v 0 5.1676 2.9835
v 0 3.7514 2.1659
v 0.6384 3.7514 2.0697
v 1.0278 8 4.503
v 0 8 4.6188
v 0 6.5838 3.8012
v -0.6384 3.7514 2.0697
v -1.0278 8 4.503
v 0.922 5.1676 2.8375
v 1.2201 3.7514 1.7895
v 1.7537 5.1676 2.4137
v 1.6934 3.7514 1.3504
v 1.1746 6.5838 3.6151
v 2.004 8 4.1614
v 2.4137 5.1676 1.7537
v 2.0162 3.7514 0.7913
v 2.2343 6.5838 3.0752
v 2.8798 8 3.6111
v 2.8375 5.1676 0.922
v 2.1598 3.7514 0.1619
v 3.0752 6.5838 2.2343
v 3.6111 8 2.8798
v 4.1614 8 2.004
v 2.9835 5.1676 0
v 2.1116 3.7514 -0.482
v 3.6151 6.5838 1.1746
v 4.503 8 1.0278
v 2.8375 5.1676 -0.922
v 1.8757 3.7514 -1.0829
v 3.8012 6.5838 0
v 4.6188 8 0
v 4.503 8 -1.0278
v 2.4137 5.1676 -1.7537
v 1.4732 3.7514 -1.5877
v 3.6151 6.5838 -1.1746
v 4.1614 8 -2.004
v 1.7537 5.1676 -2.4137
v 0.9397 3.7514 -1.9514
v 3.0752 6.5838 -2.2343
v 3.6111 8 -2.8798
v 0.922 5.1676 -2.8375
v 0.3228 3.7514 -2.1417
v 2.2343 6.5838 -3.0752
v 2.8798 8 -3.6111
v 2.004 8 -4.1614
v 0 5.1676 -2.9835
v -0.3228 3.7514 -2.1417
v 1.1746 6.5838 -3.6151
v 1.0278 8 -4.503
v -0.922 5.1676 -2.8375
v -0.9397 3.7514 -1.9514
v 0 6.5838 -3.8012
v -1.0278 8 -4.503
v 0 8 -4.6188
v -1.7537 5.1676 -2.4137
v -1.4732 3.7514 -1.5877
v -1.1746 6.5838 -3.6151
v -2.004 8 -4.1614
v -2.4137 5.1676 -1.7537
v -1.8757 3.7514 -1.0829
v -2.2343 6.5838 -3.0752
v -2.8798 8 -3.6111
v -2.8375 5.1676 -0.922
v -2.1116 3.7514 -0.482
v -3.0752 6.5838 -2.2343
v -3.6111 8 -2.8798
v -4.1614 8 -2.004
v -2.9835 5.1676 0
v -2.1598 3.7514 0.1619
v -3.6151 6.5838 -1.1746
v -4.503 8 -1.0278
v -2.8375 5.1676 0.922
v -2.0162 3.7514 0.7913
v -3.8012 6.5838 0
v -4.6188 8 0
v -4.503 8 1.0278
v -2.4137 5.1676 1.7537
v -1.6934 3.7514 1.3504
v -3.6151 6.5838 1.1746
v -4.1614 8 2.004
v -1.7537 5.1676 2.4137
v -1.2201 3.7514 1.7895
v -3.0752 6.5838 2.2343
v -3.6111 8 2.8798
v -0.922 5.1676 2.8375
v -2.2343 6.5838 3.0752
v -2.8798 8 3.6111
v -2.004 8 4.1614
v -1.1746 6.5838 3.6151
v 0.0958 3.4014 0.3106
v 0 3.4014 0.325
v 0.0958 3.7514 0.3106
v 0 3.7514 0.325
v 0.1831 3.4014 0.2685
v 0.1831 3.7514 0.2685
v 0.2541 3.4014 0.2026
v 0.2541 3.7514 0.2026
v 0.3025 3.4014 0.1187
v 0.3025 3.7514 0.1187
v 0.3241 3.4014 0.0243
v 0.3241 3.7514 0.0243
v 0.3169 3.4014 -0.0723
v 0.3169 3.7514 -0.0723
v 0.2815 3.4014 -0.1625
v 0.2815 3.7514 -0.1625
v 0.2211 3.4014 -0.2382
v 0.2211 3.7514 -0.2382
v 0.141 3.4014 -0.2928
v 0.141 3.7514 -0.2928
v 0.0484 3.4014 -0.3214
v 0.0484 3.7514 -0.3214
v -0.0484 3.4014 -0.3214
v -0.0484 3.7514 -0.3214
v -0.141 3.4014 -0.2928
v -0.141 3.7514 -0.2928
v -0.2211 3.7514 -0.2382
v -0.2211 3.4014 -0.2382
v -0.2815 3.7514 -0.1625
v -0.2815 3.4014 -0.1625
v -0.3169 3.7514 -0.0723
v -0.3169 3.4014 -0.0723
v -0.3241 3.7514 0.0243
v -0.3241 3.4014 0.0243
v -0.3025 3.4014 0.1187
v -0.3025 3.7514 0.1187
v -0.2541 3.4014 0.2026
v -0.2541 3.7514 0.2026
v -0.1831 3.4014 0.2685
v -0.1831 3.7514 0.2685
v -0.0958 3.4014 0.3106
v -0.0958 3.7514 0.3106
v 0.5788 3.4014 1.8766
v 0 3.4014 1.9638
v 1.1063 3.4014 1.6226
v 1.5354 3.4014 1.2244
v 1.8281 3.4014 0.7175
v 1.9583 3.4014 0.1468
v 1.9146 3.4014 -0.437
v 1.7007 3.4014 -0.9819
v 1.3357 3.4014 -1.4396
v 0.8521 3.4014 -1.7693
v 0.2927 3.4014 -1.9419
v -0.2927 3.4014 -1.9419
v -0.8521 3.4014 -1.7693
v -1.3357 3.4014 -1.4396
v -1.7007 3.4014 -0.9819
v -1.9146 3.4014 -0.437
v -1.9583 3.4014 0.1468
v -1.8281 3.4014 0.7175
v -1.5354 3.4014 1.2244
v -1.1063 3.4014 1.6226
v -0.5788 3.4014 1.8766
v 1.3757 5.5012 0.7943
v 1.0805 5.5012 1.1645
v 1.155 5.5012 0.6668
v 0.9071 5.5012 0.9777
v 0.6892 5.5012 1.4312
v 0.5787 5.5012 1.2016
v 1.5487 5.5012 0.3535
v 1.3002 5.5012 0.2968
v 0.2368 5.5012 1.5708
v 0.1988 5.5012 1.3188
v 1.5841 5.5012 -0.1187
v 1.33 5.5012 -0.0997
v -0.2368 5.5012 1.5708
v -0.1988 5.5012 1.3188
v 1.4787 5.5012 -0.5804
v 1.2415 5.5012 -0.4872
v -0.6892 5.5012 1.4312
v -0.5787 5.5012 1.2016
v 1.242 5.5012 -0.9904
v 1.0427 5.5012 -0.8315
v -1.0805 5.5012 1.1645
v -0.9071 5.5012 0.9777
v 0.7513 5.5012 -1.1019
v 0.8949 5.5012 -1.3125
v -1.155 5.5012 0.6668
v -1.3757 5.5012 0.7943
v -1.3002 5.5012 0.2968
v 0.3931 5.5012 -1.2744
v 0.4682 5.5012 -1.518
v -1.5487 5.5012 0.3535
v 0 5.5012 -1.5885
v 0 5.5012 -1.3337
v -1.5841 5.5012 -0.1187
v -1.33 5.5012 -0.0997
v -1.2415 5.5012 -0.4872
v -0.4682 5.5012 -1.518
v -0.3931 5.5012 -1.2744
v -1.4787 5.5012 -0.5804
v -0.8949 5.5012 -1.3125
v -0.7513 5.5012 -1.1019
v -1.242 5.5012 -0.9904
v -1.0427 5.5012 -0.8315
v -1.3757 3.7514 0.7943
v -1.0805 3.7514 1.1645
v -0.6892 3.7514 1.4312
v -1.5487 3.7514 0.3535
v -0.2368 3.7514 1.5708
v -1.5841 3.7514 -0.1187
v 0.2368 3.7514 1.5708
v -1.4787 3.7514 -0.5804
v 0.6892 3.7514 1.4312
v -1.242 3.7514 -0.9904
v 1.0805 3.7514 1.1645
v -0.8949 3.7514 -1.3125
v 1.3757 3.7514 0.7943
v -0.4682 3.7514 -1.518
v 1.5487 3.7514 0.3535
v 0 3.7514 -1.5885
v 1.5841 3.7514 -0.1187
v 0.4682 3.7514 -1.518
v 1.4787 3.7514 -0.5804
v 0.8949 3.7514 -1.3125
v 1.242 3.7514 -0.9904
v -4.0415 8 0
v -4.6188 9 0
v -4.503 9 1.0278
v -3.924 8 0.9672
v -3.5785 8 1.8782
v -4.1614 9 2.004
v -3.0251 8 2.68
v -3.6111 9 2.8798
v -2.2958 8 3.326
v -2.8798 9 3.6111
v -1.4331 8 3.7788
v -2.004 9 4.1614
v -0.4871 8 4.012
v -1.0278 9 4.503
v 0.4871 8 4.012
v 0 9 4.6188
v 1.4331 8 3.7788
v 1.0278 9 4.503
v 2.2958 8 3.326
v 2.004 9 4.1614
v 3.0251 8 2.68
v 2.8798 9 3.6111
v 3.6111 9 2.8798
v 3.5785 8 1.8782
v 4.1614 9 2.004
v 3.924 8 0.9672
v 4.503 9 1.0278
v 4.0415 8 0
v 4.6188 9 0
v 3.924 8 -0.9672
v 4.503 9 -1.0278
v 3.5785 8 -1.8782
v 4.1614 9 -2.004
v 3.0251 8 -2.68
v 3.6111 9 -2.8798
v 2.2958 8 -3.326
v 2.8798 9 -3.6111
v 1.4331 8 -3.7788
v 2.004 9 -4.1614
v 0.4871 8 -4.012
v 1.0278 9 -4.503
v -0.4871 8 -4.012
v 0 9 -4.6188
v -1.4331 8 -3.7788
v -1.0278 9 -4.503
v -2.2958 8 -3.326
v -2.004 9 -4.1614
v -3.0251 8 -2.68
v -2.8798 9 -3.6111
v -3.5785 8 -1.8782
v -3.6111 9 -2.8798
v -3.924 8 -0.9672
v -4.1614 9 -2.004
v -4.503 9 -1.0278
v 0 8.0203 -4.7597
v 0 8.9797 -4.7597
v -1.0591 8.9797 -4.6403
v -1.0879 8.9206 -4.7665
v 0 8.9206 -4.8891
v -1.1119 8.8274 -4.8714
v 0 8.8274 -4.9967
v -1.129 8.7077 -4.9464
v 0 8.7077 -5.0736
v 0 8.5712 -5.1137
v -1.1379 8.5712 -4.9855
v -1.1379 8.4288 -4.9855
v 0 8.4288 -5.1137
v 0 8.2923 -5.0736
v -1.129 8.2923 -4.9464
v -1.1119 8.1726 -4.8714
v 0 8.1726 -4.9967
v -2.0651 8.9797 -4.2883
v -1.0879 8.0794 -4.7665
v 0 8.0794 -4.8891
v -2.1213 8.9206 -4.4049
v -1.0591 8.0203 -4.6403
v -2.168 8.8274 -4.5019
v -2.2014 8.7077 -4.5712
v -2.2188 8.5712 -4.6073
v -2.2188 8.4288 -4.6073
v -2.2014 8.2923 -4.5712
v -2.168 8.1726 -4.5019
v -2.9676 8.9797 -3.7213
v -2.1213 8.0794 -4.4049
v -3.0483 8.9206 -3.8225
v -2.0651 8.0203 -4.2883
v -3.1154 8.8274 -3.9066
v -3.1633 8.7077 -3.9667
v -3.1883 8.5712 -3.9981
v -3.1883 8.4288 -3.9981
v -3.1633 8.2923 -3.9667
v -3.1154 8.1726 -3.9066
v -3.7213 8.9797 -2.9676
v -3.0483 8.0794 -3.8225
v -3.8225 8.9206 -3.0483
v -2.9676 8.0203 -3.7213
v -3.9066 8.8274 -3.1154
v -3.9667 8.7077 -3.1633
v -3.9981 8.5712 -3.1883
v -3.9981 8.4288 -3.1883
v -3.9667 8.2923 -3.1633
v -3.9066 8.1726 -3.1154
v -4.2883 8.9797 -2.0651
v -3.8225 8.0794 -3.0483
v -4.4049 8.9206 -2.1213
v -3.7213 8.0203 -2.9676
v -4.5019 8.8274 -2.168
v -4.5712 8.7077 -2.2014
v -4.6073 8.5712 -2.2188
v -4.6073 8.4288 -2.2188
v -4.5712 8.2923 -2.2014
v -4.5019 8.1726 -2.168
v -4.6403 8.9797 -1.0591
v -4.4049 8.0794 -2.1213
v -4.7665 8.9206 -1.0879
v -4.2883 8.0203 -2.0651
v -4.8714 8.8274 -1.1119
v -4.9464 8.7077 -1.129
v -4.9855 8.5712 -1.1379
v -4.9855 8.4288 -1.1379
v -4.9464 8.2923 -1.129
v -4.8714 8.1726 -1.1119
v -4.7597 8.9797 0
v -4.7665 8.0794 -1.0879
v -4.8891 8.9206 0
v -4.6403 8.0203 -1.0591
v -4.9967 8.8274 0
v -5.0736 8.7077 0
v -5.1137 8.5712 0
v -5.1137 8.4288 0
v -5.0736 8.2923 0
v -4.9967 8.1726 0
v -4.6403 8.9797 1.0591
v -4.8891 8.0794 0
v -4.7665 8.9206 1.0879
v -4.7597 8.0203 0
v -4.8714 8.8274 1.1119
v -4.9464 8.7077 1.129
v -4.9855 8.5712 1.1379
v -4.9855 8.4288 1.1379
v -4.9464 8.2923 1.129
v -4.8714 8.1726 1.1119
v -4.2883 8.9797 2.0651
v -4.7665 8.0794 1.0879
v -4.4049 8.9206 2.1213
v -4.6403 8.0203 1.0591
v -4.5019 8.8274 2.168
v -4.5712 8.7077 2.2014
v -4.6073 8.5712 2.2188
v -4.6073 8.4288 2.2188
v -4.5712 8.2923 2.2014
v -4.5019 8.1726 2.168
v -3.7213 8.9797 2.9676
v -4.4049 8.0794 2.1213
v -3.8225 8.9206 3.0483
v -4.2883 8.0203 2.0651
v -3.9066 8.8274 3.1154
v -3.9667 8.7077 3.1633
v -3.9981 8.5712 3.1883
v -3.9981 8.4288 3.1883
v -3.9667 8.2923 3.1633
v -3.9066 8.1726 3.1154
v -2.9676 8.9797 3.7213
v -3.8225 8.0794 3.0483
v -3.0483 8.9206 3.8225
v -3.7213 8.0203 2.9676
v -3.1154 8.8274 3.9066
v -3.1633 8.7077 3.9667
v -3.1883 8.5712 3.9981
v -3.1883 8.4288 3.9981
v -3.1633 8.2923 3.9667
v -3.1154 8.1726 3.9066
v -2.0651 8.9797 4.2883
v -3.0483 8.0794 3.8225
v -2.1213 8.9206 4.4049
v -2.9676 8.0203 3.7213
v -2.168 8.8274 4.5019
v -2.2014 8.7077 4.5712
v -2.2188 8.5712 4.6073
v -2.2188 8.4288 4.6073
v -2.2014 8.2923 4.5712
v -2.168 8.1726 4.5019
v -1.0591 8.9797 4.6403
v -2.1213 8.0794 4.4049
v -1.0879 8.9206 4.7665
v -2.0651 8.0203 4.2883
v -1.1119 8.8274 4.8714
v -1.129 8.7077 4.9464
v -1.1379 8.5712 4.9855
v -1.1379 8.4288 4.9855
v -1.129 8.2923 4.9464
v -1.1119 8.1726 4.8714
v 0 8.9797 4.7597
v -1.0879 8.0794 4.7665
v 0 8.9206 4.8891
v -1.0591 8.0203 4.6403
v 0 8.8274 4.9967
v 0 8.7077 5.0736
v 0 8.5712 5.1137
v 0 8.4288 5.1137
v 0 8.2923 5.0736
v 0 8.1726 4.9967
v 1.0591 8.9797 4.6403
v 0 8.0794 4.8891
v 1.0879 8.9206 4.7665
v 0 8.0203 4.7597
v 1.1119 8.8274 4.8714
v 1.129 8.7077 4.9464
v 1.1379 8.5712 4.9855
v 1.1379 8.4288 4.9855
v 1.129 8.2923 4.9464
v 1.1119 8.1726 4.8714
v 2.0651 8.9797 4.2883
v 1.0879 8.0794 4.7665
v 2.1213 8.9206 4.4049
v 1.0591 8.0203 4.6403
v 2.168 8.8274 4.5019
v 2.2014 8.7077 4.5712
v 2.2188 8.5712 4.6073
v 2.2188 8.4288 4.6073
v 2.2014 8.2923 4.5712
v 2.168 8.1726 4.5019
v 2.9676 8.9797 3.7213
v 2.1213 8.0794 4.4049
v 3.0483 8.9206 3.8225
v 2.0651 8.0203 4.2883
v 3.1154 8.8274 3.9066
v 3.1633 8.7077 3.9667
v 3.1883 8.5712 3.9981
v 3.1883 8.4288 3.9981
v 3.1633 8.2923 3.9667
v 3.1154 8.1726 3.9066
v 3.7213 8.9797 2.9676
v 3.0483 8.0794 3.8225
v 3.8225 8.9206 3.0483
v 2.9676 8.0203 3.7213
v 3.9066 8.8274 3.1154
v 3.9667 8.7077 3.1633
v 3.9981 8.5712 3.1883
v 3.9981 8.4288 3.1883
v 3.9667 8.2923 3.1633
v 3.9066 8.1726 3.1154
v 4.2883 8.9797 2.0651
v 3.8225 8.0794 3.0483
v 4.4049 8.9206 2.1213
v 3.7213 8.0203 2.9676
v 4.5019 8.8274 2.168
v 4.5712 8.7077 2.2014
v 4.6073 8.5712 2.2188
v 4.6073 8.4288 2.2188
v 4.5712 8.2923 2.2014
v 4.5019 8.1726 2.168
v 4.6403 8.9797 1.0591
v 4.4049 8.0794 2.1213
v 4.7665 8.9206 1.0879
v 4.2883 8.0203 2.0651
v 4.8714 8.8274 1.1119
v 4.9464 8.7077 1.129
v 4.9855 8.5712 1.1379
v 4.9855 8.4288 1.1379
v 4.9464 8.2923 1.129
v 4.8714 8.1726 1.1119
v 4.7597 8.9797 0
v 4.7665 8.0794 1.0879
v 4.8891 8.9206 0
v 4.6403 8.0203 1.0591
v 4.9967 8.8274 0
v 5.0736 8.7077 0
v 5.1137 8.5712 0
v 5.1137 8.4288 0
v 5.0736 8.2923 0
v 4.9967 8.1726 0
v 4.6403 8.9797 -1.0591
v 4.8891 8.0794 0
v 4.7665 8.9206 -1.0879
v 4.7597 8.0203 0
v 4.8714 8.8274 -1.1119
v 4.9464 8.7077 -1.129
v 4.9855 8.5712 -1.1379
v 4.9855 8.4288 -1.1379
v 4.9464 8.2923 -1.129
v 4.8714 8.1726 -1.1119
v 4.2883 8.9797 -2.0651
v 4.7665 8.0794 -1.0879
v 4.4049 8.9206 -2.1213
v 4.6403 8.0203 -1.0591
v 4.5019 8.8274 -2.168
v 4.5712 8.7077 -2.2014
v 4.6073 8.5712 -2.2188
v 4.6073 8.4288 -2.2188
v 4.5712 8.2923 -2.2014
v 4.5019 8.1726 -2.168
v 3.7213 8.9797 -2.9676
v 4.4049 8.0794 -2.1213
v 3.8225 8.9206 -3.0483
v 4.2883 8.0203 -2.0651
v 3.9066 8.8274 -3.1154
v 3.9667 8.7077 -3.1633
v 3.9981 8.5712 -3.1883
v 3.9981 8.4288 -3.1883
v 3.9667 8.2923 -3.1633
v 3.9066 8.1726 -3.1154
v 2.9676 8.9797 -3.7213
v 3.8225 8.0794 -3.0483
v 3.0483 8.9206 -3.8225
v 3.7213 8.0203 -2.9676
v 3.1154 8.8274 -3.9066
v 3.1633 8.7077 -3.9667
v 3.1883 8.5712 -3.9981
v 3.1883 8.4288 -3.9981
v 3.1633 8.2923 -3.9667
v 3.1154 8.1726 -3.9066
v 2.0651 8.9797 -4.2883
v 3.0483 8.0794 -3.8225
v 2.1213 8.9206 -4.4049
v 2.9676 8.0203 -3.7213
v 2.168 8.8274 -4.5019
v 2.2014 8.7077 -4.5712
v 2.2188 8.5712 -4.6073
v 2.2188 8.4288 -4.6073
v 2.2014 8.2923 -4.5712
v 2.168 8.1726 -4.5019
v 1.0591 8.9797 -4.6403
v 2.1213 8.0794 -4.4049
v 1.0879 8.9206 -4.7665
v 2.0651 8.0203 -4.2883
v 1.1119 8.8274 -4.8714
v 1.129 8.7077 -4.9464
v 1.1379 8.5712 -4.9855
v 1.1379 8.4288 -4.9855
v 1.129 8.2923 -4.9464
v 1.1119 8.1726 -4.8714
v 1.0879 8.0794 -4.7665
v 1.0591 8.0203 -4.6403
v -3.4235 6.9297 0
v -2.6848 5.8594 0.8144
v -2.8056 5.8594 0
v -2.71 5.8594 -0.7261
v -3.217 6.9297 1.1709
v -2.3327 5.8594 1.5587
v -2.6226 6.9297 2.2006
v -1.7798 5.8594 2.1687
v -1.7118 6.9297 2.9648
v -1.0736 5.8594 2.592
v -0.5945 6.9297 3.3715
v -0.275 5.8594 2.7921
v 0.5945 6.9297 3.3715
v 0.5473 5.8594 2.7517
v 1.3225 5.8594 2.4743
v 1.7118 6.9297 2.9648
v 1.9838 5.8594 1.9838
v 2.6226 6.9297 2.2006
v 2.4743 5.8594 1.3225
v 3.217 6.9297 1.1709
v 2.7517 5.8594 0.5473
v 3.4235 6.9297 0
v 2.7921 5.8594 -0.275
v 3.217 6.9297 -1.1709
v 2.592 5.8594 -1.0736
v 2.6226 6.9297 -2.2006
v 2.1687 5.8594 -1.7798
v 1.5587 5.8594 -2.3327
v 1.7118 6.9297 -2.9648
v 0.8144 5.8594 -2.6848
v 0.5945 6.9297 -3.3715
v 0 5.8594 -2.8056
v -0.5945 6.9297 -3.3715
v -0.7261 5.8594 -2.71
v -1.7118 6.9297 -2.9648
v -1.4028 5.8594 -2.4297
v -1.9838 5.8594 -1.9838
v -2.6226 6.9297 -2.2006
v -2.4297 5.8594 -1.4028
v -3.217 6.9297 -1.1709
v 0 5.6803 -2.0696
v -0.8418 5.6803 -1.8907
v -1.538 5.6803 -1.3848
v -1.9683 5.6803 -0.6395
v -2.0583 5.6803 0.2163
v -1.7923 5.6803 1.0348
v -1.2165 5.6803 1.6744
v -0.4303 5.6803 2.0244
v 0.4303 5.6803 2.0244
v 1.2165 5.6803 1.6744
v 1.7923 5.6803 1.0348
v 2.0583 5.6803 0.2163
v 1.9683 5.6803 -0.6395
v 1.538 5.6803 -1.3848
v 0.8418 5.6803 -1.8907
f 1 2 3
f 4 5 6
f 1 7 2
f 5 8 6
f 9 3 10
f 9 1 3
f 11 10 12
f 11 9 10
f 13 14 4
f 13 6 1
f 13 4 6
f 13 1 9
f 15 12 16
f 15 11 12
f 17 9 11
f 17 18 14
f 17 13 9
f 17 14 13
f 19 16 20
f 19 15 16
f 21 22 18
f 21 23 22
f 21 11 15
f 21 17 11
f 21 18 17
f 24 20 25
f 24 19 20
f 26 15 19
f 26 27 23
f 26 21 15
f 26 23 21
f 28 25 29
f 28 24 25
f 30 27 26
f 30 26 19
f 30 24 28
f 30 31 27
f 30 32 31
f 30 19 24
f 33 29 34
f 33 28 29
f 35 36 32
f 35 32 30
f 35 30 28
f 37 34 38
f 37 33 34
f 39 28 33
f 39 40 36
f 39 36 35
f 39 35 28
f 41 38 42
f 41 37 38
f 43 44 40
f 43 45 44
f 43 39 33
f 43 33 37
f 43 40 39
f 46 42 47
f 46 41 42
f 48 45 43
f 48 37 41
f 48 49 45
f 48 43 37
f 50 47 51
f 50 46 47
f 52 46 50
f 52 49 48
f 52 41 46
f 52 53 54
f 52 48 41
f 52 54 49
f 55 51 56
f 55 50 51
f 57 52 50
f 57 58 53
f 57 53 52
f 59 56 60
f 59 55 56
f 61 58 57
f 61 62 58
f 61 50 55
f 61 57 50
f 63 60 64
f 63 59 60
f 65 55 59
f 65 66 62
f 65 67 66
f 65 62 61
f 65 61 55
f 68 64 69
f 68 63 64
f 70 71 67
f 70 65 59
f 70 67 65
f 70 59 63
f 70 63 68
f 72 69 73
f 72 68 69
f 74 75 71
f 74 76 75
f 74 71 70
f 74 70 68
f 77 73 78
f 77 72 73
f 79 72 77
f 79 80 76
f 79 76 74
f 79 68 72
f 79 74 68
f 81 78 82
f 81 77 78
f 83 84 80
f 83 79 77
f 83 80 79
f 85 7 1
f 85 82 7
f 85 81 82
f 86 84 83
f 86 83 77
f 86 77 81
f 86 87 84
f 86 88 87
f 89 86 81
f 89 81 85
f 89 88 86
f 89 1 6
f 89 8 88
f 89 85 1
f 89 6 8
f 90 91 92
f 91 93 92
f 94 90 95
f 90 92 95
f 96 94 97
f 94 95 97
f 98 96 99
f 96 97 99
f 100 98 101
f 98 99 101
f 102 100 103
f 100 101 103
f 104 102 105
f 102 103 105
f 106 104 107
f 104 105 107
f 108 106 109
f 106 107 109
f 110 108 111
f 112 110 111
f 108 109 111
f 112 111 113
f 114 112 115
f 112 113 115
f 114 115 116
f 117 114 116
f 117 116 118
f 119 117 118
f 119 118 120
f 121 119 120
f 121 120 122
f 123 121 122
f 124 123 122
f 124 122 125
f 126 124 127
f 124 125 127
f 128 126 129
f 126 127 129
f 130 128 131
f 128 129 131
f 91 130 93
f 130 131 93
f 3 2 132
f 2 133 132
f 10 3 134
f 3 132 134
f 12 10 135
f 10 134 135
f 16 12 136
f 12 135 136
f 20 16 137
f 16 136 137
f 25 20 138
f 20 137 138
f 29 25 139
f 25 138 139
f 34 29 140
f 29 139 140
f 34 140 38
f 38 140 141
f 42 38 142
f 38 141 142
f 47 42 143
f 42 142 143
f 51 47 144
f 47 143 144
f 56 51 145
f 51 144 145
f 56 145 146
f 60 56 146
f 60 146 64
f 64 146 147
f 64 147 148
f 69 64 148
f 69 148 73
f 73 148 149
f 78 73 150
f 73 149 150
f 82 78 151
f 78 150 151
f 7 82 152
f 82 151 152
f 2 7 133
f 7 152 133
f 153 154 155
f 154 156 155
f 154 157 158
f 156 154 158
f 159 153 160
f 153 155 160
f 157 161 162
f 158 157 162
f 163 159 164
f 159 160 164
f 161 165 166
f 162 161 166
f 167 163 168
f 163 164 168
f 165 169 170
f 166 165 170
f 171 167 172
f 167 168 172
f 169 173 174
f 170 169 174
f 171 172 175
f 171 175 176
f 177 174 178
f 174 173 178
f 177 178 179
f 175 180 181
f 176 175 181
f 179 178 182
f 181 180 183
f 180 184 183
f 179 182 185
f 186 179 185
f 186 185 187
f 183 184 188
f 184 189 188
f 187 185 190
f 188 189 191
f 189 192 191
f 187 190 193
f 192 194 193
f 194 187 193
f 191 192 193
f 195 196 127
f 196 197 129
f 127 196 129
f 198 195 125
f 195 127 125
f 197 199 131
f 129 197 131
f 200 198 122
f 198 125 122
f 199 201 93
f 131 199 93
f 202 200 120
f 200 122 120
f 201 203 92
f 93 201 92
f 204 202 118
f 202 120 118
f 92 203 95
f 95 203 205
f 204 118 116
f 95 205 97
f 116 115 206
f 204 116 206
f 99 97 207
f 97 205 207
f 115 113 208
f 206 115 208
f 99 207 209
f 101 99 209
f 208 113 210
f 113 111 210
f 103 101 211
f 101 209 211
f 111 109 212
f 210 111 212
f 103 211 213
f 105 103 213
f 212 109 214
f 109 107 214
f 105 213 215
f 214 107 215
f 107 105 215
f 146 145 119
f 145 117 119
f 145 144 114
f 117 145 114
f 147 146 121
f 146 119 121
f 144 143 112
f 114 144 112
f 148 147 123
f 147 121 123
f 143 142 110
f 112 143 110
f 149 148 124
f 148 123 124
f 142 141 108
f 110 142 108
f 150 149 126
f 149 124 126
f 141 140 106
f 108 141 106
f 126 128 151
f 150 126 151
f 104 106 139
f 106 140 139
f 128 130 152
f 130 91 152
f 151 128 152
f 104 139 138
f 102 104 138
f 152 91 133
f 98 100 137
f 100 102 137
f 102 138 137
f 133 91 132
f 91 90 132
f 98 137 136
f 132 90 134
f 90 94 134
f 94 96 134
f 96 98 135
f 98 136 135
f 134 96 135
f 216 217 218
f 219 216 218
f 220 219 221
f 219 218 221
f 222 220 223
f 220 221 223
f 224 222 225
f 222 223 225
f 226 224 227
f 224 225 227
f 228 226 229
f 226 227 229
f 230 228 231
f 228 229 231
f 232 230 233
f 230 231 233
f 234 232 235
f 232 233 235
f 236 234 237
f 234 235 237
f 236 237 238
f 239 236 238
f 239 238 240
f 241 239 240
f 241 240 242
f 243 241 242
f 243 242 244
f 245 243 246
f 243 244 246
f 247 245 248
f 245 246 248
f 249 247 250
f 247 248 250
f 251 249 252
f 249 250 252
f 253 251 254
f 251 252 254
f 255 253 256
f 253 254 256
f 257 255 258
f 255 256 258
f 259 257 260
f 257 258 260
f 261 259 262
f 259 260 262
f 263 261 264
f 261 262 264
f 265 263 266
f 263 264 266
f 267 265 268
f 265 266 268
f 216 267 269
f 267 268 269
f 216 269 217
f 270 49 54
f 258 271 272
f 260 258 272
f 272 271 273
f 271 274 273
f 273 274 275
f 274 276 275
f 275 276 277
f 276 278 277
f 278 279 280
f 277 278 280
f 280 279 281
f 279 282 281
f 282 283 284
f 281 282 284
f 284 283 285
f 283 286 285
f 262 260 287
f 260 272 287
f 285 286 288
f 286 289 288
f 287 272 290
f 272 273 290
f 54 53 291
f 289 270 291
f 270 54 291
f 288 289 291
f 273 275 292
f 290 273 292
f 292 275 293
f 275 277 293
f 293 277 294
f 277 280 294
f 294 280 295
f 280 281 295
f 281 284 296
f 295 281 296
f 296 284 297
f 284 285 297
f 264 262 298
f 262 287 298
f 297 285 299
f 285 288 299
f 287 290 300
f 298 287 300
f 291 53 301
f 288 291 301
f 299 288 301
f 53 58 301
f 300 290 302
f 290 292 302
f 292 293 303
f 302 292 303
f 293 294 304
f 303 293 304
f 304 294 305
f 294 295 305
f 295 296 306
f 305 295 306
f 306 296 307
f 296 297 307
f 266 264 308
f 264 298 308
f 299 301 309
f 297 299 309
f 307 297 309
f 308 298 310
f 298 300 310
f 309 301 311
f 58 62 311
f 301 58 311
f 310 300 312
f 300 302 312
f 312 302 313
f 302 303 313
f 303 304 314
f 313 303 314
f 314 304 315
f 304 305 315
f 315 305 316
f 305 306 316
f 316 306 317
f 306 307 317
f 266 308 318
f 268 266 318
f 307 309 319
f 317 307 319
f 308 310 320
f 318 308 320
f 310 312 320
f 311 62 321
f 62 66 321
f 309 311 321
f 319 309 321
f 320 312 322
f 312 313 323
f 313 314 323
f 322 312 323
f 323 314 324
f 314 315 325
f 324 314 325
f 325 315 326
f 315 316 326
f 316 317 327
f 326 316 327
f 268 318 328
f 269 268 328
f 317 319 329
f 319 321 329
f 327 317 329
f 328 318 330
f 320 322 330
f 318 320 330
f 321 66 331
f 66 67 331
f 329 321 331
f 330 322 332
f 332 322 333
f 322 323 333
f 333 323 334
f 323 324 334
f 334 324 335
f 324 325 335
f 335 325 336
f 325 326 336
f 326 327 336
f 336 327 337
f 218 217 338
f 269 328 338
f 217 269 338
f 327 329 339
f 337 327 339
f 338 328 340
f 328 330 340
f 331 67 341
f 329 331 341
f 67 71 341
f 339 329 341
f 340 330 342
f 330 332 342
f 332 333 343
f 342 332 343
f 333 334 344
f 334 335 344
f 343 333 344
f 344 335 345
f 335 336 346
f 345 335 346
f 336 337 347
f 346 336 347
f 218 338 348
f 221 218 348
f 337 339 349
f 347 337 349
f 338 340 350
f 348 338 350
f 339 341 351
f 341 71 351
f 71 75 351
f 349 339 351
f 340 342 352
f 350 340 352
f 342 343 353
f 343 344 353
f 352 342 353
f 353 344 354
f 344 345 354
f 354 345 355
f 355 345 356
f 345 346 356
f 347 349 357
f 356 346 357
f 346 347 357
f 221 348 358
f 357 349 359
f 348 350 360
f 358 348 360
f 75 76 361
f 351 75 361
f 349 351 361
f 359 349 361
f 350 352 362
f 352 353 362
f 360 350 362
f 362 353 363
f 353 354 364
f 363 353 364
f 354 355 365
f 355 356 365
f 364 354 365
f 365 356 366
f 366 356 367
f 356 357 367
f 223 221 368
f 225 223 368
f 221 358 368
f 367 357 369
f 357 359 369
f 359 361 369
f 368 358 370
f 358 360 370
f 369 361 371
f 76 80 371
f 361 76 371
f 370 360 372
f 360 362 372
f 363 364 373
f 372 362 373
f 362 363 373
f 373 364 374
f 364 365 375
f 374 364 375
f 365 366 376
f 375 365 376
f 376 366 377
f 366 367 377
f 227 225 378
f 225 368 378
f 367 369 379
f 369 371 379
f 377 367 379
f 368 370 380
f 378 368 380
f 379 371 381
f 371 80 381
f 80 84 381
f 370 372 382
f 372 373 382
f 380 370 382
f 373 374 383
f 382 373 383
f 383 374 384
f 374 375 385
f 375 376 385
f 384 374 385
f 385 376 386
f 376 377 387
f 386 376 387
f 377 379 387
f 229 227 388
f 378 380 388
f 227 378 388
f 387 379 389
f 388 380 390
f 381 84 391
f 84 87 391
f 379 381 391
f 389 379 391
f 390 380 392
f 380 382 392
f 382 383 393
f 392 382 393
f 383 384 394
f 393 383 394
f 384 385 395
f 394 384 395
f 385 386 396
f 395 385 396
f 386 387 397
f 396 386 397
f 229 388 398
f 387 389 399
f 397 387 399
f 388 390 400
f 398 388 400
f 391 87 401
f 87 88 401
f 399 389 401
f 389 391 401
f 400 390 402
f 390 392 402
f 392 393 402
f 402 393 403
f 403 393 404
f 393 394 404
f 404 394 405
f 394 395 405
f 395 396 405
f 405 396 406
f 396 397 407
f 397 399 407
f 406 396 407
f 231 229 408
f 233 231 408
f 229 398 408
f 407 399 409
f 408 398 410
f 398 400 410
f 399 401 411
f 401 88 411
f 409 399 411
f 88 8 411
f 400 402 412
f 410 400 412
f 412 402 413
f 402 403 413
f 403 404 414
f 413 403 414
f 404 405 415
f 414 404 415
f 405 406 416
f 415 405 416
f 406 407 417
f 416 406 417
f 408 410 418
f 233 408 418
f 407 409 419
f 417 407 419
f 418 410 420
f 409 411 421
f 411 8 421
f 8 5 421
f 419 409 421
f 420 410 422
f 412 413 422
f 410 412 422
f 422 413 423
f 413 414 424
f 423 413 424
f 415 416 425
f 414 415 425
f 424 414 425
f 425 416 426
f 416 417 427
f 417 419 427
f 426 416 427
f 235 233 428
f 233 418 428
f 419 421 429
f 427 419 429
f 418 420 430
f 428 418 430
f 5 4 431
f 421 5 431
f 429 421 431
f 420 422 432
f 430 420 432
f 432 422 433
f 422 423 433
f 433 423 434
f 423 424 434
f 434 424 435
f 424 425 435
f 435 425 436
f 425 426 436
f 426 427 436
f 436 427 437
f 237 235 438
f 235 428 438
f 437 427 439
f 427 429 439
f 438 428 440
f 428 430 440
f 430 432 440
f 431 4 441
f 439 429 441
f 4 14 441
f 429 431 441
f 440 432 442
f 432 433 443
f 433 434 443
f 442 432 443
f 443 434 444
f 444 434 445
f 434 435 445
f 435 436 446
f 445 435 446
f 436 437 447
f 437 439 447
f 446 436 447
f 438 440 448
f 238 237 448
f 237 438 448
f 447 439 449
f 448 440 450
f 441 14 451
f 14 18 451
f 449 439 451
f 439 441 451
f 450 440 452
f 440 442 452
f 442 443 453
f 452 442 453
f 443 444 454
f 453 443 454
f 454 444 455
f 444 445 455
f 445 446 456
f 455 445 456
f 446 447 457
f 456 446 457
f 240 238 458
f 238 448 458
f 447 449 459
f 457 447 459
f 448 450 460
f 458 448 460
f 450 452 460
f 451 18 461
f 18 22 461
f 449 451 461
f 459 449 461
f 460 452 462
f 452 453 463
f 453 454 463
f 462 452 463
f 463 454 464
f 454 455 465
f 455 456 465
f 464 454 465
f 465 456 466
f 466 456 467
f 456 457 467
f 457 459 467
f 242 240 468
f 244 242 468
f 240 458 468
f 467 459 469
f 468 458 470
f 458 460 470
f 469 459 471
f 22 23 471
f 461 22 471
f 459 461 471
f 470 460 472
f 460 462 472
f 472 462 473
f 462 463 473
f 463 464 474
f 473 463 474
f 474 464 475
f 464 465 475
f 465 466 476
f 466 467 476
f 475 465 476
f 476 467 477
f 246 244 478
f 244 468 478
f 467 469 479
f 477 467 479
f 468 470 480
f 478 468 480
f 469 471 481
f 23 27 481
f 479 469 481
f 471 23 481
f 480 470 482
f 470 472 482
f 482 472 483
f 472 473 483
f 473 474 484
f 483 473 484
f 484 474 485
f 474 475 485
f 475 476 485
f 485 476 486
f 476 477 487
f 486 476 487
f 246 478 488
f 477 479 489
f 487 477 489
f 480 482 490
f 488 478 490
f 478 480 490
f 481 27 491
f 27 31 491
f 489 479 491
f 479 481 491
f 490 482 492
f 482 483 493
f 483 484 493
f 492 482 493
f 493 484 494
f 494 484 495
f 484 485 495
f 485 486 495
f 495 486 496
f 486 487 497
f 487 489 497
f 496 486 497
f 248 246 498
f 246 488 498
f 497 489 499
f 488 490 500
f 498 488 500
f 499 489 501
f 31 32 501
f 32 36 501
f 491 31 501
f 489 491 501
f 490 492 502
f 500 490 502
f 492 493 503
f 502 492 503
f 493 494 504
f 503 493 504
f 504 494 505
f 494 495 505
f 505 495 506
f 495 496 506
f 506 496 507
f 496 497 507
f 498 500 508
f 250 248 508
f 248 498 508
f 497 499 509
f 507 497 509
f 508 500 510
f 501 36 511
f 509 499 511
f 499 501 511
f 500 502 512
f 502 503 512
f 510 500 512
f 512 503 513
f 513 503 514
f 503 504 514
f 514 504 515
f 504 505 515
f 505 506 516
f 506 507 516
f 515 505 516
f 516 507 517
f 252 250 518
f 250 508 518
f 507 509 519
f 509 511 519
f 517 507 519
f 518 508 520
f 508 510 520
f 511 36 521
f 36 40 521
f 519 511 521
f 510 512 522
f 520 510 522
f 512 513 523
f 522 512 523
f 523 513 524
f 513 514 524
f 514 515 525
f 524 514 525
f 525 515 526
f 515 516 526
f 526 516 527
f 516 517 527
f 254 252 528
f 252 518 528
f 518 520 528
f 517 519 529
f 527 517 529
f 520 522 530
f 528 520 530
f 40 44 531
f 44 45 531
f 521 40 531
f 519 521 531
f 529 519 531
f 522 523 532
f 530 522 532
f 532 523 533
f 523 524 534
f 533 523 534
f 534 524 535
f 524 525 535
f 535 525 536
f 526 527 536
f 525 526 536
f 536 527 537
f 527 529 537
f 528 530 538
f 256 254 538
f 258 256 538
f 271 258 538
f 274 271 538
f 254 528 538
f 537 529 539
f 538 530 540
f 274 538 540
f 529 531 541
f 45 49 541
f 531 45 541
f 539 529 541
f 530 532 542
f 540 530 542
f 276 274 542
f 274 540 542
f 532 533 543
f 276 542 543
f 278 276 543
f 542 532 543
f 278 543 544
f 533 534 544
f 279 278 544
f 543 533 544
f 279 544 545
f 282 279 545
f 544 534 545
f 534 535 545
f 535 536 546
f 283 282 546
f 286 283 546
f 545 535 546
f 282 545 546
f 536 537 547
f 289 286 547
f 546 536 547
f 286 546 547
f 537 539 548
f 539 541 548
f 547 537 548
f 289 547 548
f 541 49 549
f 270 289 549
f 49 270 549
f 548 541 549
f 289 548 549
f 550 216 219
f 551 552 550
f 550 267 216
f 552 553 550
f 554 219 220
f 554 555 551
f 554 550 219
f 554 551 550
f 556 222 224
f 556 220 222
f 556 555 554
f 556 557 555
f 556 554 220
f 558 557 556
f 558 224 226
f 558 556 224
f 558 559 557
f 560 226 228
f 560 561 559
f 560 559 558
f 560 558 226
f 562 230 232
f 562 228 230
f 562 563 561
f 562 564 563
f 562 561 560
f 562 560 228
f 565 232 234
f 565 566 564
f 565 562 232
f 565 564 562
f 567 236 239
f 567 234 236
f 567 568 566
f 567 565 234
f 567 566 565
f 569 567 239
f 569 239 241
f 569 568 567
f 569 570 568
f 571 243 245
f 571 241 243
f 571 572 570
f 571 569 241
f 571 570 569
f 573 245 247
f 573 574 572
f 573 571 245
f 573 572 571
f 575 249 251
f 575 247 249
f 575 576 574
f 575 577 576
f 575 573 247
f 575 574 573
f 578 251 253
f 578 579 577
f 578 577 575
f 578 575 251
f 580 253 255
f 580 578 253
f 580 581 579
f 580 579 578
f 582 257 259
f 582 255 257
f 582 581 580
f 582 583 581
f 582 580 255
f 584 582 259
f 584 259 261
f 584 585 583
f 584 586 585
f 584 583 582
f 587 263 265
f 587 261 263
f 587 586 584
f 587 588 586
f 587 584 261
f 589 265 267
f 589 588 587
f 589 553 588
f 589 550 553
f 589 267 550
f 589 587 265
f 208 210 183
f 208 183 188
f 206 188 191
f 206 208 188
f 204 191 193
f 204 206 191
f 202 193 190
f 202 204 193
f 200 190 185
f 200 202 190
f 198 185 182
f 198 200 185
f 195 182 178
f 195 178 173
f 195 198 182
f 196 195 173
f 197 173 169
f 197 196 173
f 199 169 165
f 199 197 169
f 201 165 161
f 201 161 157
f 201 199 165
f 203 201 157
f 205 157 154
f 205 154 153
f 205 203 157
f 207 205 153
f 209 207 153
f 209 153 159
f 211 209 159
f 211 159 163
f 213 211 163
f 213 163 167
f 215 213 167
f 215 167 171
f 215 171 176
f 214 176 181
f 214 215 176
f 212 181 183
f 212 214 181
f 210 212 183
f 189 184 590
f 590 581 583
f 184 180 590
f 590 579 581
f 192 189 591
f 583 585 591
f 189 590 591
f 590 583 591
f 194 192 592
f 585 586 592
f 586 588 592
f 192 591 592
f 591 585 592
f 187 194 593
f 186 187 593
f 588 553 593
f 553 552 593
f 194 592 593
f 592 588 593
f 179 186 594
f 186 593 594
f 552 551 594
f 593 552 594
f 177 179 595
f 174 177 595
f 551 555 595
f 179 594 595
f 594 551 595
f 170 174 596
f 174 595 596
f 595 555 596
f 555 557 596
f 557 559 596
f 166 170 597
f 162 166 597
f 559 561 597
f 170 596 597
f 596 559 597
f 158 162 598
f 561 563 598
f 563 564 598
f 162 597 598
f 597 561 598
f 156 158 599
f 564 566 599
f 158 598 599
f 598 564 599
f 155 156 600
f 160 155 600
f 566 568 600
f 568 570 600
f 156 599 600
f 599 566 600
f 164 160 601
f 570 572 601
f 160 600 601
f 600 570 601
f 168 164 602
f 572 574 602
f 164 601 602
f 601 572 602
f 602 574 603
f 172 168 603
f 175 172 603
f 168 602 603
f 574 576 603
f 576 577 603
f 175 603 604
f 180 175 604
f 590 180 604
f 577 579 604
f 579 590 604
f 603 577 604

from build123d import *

# Parameters (mm, degrees)
EXTRUDE_1_DEPTH          = 0.6
EXTRUDE_1_DEPTH_BACK     = 6
SKETCH_5_R               = 0.31
SKETCH_7_R               = 0.28
CUT_EXTRUDE_2_DEPTH      = 16.448840302
CUT_EXTRUDE_3_DEPTH      = 10
CUT_EXTRUDE_3_DEPTH_BACK = 10


with BuildPart() as part:
    # 草图2 → 旋转1 (revolve)
    with BuildSketch(Plane.XY):
        Polygon((0, 0), (-4.618802154, 8), (0, 8), align=None)
    revolve(axis=Axis((0, -55.266670228, 0), (0, 1, 0)))

    # 草图5 → 凸台-拉伸1 (add, two sides: drawn at the far end of the back side and taken through both)
    with BuildSketch(Plane(origin=(0, 0, 0), x_dir=(1, 0, 0), z_dir=(0, 1, 0)).offset(-EXTRUDE_1_DEPTH_BACK)):
        Circle(SKETCH_5_R)
    extrude(amount=EXTRUDE_1_DEPTH + EXTRUDE_1_DEPTH_BACK)

    # 草图7 → 切除-拉伸2 (cut, through all)
    with BuildSketch(Plane.XZ.offset(6)):
        Circle(SKETCH_7_R)
    extrude(amount=-CUT_EXTRUDE_2_DEPTH, mode=Mode.SUBTRACT)

    # 草图4 → 切除-旋转2 (revolve, cut)
    with BuildSketch(Plane.XY):
        Polygon((0, 8), (-4.041451884, 8), (0, 1), align=None)
    revolve(axis=Axis((0, 7.19521629, 0), (0, 1, 0)), mode=Mode.SUBTRACT)

    # 草图10 → 旋转3 (revolve)
    with BuildSketch(Plane.XY):
        with BuildLine():
            ThreePointArc((-4.618802154, 9), (-5.118802154, 8.5), (-4.618802154, 8))
            Line((-4.618802154, 8), (-4.041451884, 8))
            Line((-4.041451884, 8), (-4.041451884, 9))
            Line((-4.041451884, 9), (-4.618802154, 9))
        make_face()
    revolve(axis=Axis((0, 0, 0), (0, 1, 0)))

    # 草图11 → 切除-旋转3 (revolve, cut)
    with BuildSketch(Plane.XY):
        Polygon((-4.041451884, 8), (-4.932498772, 9.543338481), (-1.781160805, 9.543338481), (-1.781160805, 8), align=None)
    revolve(axis=Axis((0, 0, 0), (0, 1, 0)), mode=Mode.SUBTRACT)

    # 草图14 → 旋转4 (revolve)
    with BuildSketch(Plane.XY):
        Polygon((0.325, 3.401430976), (0.325, 3.751430976), (2.165889684, 3.751430976), (1.963817089, 3.401430976), align=None)
    revolve(axis=Axis((0, 0, 0), (0, 1, 0)))

    # 草图16 → 切除-拉伸3 (cut, two sides: drawn at the far end of the back side and taken through both)
    with BuildSketch(Plane.XY.offset(-CUT_EXTRUDE_3_DEPTH_BACK)):
        Polygon((1.38646682, 3.401430976), (4.735566884, 3.401430976), (4.735566884, -6.564906042), (-5.830144142, -6.564906042), (-5.830144142, 3.401430976), align=None)
    extrude(amount=CUT_EXTRUDE_3_DEPTH + CUT_EXTRUDE_3_DEPTH_BACK, mode=Mode.SUBTRACT)

    # 草图21 → 旋转5 (revolve)
    with BuildSketch(Plane.XY):
        Polygon((1.588539414, 3.751430976), (1.588539414, 5.341161575), (1.588539414, 5.501161575), (1.333683802, 5.501161575), (2.805566179, 5.859383166), (2.698088002, 5.673225503), align=None)
    revolve(axis=Axis((0, 0.062644637, 0), (0, 1, 0)))


solid = part.part
